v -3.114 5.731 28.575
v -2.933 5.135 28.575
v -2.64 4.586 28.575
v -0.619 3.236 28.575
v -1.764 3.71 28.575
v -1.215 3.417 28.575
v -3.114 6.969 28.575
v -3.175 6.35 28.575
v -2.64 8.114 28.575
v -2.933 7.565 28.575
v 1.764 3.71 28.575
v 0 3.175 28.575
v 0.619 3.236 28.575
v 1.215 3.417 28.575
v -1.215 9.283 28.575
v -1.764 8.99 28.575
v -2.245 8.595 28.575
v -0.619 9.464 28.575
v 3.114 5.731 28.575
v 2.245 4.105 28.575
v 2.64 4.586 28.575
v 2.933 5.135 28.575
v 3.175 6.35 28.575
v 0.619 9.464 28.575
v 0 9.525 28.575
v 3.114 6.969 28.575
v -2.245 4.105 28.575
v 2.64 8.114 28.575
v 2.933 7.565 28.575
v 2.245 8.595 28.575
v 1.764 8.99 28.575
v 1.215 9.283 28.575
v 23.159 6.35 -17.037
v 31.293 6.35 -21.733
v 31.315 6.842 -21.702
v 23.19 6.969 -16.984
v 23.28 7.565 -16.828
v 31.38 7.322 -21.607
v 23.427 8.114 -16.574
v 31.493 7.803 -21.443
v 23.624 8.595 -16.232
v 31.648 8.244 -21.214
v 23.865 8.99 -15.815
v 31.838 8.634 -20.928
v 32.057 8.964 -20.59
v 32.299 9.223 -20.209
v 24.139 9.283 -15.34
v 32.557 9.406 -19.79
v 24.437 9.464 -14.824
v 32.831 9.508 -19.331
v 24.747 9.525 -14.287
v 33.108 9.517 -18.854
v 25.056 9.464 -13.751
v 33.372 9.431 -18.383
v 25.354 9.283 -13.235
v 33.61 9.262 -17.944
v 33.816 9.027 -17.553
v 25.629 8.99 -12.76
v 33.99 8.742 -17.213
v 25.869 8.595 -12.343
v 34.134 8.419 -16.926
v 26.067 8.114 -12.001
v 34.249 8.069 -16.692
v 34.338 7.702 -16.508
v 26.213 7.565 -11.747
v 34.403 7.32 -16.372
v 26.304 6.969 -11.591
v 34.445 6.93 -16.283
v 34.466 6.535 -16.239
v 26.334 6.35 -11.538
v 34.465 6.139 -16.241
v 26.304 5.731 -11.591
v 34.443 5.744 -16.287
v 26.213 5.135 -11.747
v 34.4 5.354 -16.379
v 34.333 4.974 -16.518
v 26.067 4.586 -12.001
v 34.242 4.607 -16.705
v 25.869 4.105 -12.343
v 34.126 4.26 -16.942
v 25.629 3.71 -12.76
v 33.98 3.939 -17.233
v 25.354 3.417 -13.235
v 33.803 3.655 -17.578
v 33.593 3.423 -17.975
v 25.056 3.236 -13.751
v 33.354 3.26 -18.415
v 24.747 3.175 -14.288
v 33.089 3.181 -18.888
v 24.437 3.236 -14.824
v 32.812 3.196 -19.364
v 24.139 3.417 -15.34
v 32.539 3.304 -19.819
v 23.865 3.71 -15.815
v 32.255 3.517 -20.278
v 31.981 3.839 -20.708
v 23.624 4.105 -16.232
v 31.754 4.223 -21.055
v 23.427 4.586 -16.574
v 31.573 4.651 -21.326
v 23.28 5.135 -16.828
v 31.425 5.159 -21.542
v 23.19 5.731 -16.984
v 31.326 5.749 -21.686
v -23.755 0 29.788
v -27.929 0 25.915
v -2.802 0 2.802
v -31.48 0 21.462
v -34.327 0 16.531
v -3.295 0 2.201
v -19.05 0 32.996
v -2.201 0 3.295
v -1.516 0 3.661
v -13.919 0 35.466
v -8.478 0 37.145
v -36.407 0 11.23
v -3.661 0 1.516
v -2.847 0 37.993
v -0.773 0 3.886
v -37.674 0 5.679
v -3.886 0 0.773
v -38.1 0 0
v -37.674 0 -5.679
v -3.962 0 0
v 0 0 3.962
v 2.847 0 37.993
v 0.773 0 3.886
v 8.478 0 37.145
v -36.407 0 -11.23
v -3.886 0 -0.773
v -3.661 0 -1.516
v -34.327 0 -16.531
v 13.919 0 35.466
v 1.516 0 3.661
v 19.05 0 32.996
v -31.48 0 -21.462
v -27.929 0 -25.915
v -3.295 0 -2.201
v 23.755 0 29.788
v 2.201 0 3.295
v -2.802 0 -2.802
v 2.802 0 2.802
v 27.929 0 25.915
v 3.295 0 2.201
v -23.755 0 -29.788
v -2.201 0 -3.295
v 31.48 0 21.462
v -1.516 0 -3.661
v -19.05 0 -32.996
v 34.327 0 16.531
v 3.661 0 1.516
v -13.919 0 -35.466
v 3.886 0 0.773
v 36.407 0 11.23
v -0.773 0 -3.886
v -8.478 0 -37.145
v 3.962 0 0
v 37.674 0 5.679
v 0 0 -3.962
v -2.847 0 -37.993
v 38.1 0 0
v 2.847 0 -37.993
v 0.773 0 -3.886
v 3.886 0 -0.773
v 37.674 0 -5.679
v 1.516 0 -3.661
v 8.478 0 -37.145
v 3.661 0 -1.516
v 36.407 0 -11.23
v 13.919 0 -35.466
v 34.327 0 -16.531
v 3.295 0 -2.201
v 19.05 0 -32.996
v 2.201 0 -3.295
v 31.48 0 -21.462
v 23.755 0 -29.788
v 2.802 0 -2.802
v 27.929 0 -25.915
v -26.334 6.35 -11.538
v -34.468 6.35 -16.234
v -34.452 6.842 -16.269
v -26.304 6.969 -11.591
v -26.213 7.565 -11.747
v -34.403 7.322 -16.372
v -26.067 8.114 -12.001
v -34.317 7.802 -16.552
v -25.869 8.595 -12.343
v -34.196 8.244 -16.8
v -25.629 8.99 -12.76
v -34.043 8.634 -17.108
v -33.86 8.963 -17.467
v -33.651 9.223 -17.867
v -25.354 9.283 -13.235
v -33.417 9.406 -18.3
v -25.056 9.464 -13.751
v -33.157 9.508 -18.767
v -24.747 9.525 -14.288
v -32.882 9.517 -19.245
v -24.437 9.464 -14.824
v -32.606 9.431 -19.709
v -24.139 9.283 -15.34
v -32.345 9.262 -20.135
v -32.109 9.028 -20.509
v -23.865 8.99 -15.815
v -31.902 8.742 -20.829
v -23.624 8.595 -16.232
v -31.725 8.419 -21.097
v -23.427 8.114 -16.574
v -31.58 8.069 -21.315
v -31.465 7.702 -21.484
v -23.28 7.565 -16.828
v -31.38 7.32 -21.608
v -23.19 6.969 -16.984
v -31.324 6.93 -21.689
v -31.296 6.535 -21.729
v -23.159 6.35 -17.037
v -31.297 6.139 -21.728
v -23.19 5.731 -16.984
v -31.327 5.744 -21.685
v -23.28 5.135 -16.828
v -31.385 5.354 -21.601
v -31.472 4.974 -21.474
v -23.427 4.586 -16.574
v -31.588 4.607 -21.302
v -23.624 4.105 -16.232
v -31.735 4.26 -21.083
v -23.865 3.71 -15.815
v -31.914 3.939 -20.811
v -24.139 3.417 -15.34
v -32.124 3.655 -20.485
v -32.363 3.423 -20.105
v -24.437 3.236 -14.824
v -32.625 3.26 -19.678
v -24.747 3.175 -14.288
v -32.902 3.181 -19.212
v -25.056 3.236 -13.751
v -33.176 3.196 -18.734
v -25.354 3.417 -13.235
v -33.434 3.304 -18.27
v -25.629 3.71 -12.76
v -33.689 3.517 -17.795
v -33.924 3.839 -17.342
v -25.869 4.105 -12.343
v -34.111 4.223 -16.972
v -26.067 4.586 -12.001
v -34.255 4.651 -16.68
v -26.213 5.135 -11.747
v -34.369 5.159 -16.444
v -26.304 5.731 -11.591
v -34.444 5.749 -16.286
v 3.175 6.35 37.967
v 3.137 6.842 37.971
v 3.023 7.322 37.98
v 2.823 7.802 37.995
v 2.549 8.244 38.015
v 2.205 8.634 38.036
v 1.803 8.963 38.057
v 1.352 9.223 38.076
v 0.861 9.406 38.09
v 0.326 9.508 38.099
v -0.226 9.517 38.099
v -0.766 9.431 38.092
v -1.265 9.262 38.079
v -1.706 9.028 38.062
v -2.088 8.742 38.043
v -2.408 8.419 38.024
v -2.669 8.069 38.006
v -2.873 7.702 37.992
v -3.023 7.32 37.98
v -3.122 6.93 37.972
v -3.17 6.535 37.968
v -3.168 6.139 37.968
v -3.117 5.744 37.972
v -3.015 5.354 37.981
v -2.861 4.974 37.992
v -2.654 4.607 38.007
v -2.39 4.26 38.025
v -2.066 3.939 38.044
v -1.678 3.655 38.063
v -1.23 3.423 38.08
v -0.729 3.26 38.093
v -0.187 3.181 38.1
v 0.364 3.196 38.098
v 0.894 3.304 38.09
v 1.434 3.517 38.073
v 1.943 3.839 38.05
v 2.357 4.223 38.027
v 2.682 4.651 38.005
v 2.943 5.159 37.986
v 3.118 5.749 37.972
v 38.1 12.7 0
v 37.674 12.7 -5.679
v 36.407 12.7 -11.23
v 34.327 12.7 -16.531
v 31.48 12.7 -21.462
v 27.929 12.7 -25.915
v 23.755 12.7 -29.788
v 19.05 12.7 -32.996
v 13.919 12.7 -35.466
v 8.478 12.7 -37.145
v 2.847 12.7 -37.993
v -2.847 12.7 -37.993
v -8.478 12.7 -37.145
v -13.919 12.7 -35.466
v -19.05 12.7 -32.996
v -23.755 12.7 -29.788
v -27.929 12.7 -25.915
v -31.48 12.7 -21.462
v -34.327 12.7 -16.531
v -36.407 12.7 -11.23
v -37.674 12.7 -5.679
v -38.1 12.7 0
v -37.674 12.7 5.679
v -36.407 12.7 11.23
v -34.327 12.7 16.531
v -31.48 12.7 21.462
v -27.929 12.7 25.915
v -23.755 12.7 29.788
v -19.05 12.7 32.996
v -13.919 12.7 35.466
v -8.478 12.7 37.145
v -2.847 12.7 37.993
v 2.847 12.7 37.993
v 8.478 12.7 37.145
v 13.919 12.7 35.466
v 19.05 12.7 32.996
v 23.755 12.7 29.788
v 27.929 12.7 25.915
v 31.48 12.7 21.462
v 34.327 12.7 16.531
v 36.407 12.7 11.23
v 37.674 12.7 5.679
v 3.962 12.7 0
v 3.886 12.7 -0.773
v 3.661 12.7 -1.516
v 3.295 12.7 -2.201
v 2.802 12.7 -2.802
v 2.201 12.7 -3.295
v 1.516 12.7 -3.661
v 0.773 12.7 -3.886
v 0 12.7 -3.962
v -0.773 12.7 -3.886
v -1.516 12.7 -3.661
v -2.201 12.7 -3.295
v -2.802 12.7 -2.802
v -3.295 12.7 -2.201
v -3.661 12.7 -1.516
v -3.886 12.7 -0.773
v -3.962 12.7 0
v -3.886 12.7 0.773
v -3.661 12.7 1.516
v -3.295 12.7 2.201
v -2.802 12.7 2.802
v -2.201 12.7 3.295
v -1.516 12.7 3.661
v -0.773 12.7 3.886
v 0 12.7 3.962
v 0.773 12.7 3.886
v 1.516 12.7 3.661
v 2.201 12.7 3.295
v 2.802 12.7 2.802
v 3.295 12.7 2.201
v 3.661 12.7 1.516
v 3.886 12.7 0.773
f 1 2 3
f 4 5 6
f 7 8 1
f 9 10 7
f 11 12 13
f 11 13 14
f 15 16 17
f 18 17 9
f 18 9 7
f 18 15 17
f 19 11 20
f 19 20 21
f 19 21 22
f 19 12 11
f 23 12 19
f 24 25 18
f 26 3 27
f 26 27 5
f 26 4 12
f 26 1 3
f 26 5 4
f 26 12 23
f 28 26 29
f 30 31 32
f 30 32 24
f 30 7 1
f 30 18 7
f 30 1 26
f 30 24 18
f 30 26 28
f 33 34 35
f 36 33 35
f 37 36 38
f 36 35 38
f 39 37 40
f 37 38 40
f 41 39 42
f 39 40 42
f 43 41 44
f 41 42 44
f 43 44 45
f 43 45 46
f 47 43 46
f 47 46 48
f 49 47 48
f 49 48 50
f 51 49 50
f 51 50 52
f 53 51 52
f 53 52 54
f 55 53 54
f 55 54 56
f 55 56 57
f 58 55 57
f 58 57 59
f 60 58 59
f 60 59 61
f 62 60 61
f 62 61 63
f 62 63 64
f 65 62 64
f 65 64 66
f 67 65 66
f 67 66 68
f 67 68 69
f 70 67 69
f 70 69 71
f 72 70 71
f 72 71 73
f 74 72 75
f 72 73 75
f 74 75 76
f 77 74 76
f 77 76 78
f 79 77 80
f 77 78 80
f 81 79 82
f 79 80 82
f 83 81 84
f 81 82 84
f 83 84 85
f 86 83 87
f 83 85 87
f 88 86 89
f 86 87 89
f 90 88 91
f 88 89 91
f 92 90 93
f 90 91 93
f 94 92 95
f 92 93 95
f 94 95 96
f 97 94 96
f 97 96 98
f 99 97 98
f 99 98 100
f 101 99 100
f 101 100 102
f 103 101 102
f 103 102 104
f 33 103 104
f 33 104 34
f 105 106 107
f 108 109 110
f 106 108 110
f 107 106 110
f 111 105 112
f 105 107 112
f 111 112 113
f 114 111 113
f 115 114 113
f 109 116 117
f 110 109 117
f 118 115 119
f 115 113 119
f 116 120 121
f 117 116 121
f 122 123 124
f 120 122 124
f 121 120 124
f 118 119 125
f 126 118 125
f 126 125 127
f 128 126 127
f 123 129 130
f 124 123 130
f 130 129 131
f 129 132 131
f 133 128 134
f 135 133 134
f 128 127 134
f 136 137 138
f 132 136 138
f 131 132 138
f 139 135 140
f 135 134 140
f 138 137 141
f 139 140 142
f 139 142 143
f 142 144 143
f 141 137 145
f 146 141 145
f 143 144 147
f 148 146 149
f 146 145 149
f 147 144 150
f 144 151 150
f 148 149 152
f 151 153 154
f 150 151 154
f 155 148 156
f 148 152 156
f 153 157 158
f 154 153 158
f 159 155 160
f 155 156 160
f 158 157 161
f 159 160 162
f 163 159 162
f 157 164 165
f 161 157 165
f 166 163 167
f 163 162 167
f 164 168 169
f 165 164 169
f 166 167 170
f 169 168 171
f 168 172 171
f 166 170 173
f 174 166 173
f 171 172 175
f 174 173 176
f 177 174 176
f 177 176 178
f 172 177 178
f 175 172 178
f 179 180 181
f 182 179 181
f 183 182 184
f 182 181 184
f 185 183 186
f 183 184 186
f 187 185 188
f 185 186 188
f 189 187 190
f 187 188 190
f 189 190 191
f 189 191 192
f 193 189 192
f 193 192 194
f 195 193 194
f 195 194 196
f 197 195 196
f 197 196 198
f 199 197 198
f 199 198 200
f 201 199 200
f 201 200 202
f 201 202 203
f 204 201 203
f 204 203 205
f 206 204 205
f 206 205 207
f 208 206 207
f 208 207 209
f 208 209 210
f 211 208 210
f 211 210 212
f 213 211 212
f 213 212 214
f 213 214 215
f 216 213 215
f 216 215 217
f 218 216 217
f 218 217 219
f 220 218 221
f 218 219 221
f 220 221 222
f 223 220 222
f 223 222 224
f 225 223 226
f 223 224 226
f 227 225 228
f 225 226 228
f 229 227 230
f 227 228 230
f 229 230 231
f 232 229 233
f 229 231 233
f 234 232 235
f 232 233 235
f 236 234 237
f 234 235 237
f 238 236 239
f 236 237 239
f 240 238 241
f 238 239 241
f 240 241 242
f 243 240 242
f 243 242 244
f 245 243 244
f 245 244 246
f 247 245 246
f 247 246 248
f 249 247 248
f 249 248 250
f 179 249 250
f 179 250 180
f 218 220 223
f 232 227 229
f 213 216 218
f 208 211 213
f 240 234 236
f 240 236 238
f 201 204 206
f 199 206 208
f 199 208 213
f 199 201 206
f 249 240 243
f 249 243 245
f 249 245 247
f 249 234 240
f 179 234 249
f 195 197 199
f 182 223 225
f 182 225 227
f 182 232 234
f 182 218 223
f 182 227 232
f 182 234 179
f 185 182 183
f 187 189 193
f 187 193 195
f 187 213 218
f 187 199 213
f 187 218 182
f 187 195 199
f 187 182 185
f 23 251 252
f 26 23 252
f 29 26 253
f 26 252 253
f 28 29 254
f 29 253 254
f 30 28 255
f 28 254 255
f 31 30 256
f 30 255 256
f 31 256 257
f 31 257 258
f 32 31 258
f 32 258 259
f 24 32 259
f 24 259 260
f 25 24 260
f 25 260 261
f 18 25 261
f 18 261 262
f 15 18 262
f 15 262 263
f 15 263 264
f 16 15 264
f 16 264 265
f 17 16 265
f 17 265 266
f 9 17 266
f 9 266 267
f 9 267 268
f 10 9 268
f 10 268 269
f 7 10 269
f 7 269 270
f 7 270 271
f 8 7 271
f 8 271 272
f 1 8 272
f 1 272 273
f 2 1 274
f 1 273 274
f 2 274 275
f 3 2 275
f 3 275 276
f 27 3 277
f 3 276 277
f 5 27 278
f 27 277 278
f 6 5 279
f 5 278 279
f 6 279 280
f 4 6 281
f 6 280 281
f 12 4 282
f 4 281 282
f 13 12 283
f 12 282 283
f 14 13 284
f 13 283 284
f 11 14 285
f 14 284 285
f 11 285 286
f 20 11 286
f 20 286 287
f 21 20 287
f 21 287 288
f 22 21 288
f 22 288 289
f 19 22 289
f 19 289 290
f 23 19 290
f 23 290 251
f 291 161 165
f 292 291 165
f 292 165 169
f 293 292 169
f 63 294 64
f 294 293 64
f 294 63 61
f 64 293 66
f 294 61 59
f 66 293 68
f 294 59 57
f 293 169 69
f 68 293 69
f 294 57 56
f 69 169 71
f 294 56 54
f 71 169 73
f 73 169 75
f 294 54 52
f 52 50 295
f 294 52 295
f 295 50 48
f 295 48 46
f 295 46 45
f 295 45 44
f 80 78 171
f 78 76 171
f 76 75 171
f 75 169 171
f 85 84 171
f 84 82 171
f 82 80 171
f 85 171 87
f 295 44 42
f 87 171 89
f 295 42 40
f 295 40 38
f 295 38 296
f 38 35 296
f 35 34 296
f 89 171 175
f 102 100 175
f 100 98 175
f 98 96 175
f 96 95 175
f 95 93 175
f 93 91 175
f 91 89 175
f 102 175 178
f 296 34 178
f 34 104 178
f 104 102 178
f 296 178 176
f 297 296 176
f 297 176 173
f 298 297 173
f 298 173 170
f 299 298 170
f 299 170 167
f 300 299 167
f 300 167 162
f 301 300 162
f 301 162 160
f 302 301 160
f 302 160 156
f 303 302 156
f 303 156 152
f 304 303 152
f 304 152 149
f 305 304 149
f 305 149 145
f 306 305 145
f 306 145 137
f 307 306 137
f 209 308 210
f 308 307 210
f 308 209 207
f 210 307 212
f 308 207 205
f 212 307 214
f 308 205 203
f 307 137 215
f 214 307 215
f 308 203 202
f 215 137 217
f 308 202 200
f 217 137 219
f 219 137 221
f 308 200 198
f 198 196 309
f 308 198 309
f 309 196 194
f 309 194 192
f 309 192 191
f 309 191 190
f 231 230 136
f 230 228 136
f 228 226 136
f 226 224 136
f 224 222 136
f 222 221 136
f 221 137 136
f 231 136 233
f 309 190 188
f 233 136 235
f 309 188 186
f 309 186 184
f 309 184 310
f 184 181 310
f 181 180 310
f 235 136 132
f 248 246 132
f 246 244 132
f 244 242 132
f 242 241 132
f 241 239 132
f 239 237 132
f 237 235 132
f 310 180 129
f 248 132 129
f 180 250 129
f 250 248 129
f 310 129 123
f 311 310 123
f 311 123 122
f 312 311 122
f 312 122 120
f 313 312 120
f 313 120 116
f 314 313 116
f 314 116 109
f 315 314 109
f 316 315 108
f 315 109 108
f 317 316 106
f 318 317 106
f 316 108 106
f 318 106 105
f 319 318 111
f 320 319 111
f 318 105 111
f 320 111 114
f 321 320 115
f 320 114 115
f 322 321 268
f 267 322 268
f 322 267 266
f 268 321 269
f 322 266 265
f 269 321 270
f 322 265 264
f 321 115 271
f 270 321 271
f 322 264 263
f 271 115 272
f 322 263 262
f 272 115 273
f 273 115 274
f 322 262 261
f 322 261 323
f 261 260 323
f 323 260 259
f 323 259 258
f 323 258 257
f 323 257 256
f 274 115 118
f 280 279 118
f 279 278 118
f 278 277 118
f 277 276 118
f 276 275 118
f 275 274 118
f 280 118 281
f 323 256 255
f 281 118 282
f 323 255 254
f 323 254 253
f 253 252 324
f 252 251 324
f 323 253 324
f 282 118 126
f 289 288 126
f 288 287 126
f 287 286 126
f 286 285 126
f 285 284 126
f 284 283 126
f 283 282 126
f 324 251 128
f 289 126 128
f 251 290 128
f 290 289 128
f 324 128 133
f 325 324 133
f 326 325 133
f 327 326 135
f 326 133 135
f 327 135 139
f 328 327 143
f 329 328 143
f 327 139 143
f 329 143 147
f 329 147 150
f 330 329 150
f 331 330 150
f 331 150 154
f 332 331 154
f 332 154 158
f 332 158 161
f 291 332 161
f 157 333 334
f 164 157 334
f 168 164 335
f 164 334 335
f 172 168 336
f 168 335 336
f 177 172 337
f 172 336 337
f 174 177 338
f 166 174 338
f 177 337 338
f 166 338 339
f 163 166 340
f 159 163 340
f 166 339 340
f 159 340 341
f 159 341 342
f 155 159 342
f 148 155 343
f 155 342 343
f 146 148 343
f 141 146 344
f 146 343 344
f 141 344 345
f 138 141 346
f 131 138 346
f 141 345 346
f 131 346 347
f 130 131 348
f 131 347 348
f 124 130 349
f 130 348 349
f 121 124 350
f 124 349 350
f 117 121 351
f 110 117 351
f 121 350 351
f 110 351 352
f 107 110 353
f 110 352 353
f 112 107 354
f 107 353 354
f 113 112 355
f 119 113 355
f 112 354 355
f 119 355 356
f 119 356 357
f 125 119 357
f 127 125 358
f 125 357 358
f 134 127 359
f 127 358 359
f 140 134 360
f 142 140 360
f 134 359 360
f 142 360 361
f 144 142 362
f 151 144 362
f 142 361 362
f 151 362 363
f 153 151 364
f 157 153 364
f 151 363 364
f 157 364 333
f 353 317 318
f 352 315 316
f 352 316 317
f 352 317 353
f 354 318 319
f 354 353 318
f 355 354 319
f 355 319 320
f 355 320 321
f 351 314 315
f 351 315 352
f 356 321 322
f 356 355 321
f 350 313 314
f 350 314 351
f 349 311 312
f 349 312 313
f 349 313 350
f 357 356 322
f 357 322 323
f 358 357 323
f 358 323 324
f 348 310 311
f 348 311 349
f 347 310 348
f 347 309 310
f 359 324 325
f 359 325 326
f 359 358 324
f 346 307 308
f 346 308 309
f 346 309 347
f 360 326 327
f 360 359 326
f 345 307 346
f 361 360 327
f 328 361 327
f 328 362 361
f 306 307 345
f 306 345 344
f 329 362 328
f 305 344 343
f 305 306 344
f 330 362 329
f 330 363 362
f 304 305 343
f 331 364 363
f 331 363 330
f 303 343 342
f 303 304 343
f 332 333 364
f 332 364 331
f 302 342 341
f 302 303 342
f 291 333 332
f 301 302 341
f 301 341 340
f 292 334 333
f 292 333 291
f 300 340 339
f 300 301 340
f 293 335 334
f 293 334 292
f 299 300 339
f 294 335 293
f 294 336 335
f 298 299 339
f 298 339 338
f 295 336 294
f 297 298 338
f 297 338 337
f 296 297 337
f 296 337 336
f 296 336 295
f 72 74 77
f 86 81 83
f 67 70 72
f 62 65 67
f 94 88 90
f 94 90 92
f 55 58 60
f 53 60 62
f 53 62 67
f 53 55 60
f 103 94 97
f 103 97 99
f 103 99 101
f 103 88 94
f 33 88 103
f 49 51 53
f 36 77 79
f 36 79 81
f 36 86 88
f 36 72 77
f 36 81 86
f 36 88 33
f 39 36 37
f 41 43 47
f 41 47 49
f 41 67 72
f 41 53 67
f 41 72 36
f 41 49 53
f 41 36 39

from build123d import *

# Parameters (mm, degrees)
SKETCH1_R           = 38.1
BOSS_EXTRUDE1_DEPTH = 12.7
SKETCH2_R           = 3.175
CUT_EXTRUDE1_DEPTH  = 9.525
CIRPATTERN1_COUNT   = 3
SKETCH3_R           = 3.9624
CUT_EXTRUDE2_DEPTH  = 12.7


with BuildPart() as part:
    # Sketch1 → Boss-Extrude1 (new body)
    with BuildSketch(Plane(origin=(0, 0, 0), x_dir=(1, 0, 0), z_dir=(0, 1, 0))):
        Circle(SKETCH1_R)
    extrude(amount=BOSS_EXTRUDE1_DEPTH)

    # Sketch2 → Cut-Extrude1 (cut)
    with BuildSketch(Plane.XY.offset(38.1)):
        with Locations((0, 6.35)):
            Circle(SKETCH2_R)
    cut_extrude1 = extrude(amount=-CUT_EXTRUDE1_DEPTH, mode=Mode.SUBTRACT)

    # CirPattern1: Cut-Extrude1 ×3 about axis
    cirpattern1_axis = Axis((0, 0, 0), (0, 1, 0))
    for i in range(1, CIRPATTERN1_COUNT):
        add(cut_extrude1.rotate(cirpattern1_axis, i * 360 / CIRPATTERN1_COUNT), mode=Mode.SUBTRACT)

    # Sketch3 → Cut-Extrude2 (cut)
    with BuildSketch(Plane(origin=(0, 12.7, 0), x_dir=(1, 0, 0), z_dir=(0, 1, 0))):
        Circle(SKETCH3_R)
    extrude(amount=-CUT_EXTRUDE2_DEPTH, mode=Mode.SUBTRACT)


solid = part.part
